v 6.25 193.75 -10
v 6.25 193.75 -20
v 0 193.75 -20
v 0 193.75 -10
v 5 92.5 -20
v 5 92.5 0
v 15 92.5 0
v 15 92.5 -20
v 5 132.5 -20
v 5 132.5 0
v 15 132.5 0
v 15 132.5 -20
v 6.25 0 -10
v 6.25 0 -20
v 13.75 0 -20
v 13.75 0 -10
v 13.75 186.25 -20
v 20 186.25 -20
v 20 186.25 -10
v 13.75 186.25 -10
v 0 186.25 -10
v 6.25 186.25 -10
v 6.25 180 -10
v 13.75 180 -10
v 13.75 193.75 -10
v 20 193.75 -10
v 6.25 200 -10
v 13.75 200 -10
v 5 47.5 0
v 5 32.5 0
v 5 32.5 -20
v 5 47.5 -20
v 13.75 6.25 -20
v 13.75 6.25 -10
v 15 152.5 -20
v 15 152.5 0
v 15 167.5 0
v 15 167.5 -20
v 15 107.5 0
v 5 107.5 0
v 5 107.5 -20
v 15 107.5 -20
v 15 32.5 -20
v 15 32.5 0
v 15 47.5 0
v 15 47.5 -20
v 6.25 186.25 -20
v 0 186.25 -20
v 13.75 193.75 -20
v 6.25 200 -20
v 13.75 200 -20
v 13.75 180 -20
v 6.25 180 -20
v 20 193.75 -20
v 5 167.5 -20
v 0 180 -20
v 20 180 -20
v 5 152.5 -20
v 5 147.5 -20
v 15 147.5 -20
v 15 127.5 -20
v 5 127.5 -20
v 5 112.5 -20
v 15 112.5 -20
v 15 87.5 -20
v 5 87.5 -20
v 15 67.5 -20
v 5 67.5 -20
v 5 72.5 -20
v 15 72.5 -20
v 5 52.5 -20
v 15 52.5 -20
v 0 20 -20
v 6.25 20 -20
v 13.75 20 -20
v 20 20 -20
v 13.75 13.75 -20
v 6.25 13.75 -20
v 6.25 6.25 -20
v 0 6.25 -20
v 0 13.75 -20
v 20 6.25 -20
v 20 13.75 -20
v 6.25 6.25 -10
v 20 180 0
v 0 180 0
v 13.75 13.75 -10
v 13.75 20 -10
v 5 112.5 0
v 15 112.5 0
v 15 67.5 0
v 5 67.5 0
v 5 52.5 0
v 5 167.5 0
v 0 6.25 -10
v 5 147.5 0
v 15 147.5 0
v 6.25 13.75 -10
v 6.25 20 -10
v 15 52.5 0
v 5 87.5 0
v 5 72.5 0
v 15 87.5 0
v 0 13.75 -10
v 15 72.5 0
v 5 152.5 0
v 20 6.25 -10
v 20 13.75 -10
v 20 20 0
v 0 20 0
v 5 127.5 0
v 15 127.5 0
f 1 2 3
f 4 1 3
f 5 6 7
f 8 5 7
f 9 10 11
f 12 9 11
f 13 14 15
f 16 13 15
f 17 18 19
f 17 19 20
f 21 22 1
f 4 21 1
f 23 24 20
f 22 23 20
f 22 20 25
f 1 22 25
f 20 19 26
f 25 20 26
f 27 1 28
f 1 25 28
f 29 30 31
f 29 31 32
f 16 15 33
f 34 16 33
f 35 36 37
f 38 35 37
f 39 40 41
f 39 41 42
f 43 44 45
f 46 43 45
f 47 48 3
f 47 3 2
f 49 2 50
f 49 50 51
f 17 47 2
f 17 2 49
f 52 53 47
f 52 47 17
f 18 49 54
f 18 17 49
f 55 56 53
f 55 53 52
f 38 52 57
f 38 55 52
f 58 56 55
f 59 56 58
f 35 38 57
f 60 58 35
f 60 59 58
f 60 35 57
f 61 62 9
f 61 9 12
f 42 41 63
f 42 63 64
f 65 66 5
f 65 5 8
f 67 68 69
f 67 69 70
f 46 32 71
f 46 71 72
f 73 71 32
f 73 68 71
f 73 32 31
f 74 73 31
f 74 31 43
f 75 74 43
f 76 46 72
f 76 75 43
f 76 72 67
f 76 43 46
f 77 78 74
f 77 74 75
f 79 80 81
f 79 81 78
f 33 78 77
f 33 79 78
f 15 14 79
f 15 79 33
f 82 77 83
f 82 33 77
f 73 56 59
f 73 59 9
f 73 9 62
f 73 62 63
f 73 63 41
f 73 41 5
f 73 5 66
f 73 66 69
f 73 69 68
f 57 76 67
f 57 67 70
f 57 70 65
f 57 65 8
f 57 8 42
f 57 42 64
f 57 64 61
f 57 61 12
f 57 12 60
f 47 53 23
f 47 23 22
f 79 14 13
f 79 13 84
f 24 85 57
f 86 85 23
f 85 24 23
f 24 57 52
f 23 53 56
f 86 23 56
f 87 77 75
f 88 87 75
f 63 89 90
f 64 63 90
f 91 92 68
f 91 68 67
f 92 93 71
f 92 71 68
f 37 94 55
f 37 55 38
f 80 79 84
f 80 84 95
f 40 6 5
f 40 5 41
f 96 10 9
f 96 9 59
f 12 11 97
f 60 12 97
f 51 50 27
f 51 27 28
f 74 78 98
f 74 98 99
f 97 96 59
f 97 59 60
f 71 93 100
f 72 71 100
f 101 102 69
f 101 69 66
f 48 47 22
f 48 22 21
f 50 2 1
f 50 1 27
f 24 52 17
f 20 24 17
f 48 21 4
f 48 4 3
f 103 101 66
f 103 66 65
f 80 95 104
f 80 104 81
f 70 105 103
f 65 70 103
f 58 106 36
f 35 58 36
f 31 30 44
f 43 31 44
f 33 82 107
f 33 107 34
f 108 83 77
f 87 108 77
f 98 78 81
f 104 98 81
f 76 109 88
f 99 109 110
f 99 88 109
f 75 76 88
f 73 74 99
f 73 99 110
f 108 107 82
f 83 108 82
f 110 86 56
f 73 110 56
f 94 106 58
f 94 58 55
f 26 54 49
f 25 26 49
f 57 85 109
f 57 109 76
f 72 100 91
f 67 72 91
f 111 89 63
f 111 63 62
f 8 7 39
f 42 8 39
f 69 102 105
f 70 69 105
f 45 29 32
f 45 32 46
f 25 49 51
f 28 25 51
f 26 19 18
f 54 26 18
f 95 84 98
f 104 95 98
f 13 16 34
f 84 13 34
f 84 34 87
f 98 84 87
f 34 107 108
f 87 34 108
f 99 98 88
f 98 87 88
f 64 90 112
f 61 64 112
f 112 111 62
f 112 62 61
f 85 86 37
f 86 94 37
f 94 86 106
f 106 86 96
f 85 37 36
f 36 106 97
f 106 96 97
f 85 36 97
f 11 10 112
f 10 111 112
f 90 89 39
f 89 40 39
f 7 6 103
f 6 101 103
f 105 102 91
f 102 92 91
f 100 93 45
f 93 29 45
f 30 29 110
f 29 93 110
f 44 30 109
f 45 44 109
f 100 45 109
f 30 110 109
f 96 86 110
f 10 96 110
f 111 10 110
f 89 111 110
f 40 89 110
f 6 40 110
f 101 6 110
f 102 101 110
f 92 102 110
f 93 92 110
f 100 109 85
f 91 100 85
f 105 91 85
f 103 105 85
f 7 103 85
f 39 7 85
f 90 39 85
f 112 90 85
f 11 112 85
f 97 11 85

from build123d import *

# Parameters (mm, degrees)
SKETCH1_W           = 20
SKETCH1_H           = 20
BOSS_EXTRUDE1_DEPTH = 200
SKETCH2_W           = 10
SKETCH2_H           = 20
CUT_EXTRUDE1_DEPTH  = 21
SKETCH3_W           = 6.25
SKETCH3_H           = 6.25
CUT_EXTRUDE2_DEPTH  = 21
SKETCH4_W           = 6.25
SKETCH4_H           = 6.25
CUT_EXTRUDE3_DEPTH  = 21
SKETCH5_W           = 10
SKETCH5_H           = 15
CUT_EXTRUDE4_DEPTH  = 21


with BuildPart() as part:
    # Sketch1 → Boss-Extrude1 (new body)
    with BuildSketch(Plane(origin=(0, 0, 0), x_dir=(1, 0, 0), z_dir=(0, 1, 0))):
        with Locations((10, 10)):
            Rectangle(SKETCH1_W, SKETCH1_H)
    extrude(amount=BOSS_EXTRUDE1_DEPTH)

    # Sketch2 → Cut-Extrude1 (cut, through all)
    with BuildSketch(Plane(origin=(20, 0, 0), x_dir=(0, 0, -1), z_dir=(1, 0, 0))):
        with Locations((5, 190)):
            Rectangle(SKETCH2_W, SKETCH2_H)
        with Locations((5, 10)):
            Rectangle(SKETCH2_W, SKETCH2_H)
    extrude(amount=-CUT_EXTRUDE1_DEPTH, mode=Mode.SUBTRACT)

    # Sketch3 → Cut-Extrude2 (cut, through all)
    with BuildSketch(Plane(origin=(0, 0, -20), x_dir=(-1, 0, 0), z_dir=(0, 0, -1))):
        with Locations((-3.125, 196.875)):
            Rectangle(SKETCH3_W, SKETCH3_H)
        with Locations((-16.875, 196.875)):
            Rectangle(SKETCH3_W, SKETCH3_H)
        with Locations((-16.875, 183.125)):
            Rectangle(SKETCH3_W, SKETCH3_H)
        with Locations((-3.125, 183.125)):
            Rectangle(SKETCH3_W, SKETCH3_H)
    extrude(amount=-CUT_EXTRUDE2_DEPTH, mode=Mode.SUBTRACT)

    # Sketch4 → Cut-Extrude3 (cut, through all)
    with BuildSketch(Plane(origin=(0, 0, -20), x_dir=(-1, 0, 0), z_dir=(0, 0, -1))):
        with Locations((-16.875, 16.875)):
            Rectangle(SKETCH4_W, SKETCH4_H)
        with Locations((-16.875, 3.125)):
            Rectangle(SKETCH4_W, SKETCH4_H)
        with Locations((-3.125, 16.875)):
            Rectangle(SKETCH4_W, SKETCH4_H)
        with Locations((-3.125, 3.125)):
            Rectangle(SKETCH4_W, SKETCH4_H)
    extrude(amount=-CUT_EXTRUDE3_DEPTH, mode=Mode.SUBTRACT)

    # Sketch5 → Cut-Extrude4 (cut, through all)
    with BuildSketch(Plane.XY):
        with Locations((10, 40)):
            Rectangle(SKETCH5_W, SKETCH5_H)
        with Locations((10, 60)):
            Rectangle(SKETCH5_W, SKETCH5_H)
        with Locations((10, 80)):
            Rectangle(SKETCH5_W, SKETCH5_H)
        with Locations((10, 100)):
            Rectangle(SKETCH5_W, SKETCH5_H)
        with Locations((10, 120)):
            Rectangle(SKETCH5_W, SKETCH5_H)
        with Locations((10, 140)):
            Rectangle(SKETCH5_W, SKETCH5_H)
        with Locations((10, 160)):
            Rectangle(SKETCH5_W, SKETCH5_H)
    extrude(amount=-CUT_EXTRUDE4_DEPTH, mode=Mode.SUBTRACT)


solid = part.part
